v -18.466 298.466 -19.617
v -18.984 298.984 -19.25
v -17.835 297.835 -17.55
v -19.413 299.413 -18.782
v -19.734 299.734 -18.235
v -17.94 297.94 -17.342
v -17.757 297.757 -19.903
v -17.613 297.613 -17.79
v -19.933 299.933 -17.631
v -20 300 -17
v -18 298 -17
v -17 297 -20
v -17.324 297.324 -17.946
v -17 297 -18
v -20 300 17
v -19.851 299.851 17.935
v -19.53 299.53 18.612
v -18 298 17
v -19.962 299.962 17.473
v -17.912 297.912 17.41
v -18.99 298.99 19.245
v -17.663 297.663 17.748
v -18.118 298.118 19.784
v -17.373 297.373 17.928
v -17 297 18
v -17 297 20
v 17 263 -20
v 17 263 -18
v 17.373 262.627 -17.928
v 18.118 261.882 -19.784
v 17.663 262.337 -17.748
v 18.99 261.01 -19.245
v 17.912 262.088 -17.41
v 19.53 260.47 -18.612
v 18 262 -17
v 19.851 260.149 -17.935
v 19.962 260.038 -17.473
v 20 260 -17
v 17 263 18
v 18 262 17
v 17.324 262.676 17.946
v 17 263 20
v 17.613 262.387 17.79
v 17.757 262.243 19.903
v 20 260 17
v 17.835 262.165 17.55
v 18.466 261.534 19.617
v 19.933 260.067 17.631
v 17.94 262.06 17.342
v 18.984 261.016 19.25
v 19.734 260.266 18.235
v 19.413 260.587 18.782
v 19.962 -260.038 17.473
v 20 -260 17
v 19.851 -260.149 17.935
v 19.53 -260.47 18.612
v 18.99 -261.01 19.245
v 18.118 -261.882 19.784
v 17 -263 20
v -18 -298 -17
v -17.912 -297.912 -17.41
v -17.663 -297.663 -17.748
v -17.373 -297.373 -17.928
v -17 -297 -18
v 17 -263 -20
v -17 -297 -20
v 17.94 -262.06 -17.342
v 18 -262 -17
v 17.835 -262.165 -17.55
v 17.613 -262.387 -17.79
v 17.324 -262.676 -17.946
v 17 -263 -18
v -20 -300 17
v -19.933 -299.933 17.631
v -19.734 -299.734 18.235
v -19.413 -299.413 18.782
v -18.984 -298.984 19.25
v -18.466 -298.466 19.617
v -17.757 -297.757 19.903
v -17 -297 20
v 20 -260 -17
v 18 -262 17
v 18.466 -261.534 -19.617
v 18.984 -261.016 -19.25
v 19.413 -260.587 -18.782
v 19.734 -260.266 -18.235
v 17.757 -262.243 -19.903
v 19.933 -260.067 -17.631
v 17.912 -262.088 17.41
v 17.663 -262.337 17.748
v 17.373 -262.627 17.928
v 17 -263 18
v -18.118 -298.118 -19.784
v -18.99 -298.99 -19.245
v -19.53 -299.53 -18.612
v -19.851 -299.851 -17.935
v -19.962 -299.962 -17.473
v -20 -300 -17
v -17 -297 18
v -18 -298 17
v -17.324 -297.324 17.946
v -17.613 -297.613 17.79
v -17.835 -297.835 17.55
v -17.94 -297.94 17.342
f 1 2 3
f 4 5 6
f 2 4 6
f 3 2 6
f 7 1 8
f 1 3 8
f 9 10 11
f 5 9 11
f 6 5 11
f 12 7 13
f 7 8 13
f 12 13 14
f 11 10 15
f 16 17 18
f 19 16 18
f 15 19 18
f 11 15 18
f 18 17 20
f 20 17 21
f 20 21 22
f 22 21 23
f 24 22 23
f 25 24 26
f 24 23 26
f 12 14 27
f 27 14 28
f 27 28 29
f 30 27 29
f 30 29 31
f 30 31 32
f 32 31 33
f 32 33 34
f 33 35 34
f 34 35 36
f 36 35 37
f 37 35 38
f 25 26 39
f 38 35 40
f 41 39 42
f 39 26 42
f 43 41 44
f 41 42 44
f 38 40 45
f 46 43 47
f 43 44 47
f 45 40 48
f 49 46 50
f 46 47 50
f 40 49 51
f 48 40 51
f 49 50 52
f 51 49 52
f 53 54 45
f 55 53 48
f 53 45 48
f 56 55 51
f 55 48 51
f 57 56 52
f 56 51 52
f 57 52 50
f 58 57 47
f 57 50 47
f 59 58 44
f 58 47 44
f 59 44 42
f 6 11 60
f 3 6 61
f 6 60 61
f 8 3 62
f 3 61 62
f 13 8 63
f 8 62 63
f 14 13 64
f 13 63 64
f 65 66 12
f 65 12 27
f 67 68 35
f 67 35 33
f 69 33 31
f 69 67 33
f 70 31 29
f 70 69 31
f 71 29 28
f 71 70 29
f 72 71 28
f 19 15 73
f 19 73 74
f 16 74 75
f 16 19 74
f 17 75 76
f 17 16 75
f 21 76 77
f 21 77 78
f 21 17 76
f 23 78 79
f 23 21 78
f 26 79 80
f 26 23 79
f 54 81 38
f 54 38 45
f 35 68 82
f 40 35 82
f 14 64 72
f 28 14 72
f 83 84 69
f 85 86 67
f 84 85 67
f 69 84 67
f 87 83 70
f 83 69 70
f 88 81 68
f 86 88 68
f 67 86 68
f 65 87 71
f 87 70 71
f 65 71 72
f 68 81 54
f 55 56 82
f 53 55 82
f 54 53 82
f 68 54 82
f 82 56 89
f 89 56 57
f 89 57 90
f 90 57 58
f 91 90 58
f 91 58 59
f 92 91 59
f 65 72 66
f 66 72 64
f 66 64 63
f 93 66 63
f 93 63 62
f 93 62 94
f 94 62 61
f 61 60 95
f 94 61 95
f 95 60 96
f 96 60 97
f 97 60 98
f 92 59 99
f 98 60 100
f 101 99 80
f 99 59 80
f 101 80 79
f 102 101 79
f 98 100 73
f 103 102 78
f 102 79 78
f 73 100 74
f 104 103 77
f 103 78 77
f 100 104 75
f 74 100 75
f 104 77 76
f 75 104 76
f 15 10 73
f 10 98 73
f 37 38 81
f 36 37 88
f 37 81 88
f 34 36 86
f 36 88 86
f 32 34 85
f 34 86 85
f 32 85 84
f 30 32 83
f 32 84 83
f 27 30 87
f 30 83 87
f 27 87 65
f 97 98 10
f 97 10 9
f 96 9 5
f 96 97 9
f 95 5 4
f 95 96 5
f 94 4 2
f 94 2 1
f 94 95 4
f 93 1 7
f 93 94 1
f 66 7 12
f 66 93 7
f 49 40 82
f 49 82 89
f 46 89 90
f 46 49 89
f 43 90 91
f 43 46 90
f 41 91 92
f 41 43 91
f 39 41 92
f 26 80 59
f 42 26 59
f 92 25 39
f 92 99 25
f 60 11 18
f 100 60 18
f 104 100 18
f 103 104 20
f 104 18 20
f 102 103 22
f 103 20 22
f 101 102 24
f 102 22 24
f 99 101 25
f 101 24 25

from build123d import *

# Parameters (mm, degrees)
F2_W     = 40
F2_H     = 40
F3_DEPTH = 300
F4_R     = 3
F5_T     = -2
F7_DEPTH = 40.001


with BuildPart() as f3:
    # F2 (on Front) → F3 (new body, symmetric)
    with BuildSketch(Plane.XZ):
        Rectangle(F2_W, F2_H)
    extrude(amount=F3_DEPTH, both=True)

    # F4
    f4_edges = [f3.edges().sort_by_distance(p)[0] for p in [
        (20, 0, 20),
        (-20, 0, 20),
        (20, 0, -20),
        (-20, 0, -20),
    ]]
    fillet(f4_edges, radius=F4_R)

    # F5
    f5_openings = [f3.faces().sort_by_distance(p)[0] for p in [
        (0, -300, 0),
        (0, 300, 0),
    ]]
    offset(amount=F5_T, openings=f5_openings)

    # F6 (on face) → F7 (cut, through all)
    with BuildSketch(Plane.XY.offset(20)):
        Polygon((20, -300), (20, -260), (-20, -300), align=None)
        Polygon((20, 300), (-20, 300), (20, 260), align=None)
    extrude(amount=-F7_DEPTH, mode=Mode.SUBTRACT)


solid = f3.part
